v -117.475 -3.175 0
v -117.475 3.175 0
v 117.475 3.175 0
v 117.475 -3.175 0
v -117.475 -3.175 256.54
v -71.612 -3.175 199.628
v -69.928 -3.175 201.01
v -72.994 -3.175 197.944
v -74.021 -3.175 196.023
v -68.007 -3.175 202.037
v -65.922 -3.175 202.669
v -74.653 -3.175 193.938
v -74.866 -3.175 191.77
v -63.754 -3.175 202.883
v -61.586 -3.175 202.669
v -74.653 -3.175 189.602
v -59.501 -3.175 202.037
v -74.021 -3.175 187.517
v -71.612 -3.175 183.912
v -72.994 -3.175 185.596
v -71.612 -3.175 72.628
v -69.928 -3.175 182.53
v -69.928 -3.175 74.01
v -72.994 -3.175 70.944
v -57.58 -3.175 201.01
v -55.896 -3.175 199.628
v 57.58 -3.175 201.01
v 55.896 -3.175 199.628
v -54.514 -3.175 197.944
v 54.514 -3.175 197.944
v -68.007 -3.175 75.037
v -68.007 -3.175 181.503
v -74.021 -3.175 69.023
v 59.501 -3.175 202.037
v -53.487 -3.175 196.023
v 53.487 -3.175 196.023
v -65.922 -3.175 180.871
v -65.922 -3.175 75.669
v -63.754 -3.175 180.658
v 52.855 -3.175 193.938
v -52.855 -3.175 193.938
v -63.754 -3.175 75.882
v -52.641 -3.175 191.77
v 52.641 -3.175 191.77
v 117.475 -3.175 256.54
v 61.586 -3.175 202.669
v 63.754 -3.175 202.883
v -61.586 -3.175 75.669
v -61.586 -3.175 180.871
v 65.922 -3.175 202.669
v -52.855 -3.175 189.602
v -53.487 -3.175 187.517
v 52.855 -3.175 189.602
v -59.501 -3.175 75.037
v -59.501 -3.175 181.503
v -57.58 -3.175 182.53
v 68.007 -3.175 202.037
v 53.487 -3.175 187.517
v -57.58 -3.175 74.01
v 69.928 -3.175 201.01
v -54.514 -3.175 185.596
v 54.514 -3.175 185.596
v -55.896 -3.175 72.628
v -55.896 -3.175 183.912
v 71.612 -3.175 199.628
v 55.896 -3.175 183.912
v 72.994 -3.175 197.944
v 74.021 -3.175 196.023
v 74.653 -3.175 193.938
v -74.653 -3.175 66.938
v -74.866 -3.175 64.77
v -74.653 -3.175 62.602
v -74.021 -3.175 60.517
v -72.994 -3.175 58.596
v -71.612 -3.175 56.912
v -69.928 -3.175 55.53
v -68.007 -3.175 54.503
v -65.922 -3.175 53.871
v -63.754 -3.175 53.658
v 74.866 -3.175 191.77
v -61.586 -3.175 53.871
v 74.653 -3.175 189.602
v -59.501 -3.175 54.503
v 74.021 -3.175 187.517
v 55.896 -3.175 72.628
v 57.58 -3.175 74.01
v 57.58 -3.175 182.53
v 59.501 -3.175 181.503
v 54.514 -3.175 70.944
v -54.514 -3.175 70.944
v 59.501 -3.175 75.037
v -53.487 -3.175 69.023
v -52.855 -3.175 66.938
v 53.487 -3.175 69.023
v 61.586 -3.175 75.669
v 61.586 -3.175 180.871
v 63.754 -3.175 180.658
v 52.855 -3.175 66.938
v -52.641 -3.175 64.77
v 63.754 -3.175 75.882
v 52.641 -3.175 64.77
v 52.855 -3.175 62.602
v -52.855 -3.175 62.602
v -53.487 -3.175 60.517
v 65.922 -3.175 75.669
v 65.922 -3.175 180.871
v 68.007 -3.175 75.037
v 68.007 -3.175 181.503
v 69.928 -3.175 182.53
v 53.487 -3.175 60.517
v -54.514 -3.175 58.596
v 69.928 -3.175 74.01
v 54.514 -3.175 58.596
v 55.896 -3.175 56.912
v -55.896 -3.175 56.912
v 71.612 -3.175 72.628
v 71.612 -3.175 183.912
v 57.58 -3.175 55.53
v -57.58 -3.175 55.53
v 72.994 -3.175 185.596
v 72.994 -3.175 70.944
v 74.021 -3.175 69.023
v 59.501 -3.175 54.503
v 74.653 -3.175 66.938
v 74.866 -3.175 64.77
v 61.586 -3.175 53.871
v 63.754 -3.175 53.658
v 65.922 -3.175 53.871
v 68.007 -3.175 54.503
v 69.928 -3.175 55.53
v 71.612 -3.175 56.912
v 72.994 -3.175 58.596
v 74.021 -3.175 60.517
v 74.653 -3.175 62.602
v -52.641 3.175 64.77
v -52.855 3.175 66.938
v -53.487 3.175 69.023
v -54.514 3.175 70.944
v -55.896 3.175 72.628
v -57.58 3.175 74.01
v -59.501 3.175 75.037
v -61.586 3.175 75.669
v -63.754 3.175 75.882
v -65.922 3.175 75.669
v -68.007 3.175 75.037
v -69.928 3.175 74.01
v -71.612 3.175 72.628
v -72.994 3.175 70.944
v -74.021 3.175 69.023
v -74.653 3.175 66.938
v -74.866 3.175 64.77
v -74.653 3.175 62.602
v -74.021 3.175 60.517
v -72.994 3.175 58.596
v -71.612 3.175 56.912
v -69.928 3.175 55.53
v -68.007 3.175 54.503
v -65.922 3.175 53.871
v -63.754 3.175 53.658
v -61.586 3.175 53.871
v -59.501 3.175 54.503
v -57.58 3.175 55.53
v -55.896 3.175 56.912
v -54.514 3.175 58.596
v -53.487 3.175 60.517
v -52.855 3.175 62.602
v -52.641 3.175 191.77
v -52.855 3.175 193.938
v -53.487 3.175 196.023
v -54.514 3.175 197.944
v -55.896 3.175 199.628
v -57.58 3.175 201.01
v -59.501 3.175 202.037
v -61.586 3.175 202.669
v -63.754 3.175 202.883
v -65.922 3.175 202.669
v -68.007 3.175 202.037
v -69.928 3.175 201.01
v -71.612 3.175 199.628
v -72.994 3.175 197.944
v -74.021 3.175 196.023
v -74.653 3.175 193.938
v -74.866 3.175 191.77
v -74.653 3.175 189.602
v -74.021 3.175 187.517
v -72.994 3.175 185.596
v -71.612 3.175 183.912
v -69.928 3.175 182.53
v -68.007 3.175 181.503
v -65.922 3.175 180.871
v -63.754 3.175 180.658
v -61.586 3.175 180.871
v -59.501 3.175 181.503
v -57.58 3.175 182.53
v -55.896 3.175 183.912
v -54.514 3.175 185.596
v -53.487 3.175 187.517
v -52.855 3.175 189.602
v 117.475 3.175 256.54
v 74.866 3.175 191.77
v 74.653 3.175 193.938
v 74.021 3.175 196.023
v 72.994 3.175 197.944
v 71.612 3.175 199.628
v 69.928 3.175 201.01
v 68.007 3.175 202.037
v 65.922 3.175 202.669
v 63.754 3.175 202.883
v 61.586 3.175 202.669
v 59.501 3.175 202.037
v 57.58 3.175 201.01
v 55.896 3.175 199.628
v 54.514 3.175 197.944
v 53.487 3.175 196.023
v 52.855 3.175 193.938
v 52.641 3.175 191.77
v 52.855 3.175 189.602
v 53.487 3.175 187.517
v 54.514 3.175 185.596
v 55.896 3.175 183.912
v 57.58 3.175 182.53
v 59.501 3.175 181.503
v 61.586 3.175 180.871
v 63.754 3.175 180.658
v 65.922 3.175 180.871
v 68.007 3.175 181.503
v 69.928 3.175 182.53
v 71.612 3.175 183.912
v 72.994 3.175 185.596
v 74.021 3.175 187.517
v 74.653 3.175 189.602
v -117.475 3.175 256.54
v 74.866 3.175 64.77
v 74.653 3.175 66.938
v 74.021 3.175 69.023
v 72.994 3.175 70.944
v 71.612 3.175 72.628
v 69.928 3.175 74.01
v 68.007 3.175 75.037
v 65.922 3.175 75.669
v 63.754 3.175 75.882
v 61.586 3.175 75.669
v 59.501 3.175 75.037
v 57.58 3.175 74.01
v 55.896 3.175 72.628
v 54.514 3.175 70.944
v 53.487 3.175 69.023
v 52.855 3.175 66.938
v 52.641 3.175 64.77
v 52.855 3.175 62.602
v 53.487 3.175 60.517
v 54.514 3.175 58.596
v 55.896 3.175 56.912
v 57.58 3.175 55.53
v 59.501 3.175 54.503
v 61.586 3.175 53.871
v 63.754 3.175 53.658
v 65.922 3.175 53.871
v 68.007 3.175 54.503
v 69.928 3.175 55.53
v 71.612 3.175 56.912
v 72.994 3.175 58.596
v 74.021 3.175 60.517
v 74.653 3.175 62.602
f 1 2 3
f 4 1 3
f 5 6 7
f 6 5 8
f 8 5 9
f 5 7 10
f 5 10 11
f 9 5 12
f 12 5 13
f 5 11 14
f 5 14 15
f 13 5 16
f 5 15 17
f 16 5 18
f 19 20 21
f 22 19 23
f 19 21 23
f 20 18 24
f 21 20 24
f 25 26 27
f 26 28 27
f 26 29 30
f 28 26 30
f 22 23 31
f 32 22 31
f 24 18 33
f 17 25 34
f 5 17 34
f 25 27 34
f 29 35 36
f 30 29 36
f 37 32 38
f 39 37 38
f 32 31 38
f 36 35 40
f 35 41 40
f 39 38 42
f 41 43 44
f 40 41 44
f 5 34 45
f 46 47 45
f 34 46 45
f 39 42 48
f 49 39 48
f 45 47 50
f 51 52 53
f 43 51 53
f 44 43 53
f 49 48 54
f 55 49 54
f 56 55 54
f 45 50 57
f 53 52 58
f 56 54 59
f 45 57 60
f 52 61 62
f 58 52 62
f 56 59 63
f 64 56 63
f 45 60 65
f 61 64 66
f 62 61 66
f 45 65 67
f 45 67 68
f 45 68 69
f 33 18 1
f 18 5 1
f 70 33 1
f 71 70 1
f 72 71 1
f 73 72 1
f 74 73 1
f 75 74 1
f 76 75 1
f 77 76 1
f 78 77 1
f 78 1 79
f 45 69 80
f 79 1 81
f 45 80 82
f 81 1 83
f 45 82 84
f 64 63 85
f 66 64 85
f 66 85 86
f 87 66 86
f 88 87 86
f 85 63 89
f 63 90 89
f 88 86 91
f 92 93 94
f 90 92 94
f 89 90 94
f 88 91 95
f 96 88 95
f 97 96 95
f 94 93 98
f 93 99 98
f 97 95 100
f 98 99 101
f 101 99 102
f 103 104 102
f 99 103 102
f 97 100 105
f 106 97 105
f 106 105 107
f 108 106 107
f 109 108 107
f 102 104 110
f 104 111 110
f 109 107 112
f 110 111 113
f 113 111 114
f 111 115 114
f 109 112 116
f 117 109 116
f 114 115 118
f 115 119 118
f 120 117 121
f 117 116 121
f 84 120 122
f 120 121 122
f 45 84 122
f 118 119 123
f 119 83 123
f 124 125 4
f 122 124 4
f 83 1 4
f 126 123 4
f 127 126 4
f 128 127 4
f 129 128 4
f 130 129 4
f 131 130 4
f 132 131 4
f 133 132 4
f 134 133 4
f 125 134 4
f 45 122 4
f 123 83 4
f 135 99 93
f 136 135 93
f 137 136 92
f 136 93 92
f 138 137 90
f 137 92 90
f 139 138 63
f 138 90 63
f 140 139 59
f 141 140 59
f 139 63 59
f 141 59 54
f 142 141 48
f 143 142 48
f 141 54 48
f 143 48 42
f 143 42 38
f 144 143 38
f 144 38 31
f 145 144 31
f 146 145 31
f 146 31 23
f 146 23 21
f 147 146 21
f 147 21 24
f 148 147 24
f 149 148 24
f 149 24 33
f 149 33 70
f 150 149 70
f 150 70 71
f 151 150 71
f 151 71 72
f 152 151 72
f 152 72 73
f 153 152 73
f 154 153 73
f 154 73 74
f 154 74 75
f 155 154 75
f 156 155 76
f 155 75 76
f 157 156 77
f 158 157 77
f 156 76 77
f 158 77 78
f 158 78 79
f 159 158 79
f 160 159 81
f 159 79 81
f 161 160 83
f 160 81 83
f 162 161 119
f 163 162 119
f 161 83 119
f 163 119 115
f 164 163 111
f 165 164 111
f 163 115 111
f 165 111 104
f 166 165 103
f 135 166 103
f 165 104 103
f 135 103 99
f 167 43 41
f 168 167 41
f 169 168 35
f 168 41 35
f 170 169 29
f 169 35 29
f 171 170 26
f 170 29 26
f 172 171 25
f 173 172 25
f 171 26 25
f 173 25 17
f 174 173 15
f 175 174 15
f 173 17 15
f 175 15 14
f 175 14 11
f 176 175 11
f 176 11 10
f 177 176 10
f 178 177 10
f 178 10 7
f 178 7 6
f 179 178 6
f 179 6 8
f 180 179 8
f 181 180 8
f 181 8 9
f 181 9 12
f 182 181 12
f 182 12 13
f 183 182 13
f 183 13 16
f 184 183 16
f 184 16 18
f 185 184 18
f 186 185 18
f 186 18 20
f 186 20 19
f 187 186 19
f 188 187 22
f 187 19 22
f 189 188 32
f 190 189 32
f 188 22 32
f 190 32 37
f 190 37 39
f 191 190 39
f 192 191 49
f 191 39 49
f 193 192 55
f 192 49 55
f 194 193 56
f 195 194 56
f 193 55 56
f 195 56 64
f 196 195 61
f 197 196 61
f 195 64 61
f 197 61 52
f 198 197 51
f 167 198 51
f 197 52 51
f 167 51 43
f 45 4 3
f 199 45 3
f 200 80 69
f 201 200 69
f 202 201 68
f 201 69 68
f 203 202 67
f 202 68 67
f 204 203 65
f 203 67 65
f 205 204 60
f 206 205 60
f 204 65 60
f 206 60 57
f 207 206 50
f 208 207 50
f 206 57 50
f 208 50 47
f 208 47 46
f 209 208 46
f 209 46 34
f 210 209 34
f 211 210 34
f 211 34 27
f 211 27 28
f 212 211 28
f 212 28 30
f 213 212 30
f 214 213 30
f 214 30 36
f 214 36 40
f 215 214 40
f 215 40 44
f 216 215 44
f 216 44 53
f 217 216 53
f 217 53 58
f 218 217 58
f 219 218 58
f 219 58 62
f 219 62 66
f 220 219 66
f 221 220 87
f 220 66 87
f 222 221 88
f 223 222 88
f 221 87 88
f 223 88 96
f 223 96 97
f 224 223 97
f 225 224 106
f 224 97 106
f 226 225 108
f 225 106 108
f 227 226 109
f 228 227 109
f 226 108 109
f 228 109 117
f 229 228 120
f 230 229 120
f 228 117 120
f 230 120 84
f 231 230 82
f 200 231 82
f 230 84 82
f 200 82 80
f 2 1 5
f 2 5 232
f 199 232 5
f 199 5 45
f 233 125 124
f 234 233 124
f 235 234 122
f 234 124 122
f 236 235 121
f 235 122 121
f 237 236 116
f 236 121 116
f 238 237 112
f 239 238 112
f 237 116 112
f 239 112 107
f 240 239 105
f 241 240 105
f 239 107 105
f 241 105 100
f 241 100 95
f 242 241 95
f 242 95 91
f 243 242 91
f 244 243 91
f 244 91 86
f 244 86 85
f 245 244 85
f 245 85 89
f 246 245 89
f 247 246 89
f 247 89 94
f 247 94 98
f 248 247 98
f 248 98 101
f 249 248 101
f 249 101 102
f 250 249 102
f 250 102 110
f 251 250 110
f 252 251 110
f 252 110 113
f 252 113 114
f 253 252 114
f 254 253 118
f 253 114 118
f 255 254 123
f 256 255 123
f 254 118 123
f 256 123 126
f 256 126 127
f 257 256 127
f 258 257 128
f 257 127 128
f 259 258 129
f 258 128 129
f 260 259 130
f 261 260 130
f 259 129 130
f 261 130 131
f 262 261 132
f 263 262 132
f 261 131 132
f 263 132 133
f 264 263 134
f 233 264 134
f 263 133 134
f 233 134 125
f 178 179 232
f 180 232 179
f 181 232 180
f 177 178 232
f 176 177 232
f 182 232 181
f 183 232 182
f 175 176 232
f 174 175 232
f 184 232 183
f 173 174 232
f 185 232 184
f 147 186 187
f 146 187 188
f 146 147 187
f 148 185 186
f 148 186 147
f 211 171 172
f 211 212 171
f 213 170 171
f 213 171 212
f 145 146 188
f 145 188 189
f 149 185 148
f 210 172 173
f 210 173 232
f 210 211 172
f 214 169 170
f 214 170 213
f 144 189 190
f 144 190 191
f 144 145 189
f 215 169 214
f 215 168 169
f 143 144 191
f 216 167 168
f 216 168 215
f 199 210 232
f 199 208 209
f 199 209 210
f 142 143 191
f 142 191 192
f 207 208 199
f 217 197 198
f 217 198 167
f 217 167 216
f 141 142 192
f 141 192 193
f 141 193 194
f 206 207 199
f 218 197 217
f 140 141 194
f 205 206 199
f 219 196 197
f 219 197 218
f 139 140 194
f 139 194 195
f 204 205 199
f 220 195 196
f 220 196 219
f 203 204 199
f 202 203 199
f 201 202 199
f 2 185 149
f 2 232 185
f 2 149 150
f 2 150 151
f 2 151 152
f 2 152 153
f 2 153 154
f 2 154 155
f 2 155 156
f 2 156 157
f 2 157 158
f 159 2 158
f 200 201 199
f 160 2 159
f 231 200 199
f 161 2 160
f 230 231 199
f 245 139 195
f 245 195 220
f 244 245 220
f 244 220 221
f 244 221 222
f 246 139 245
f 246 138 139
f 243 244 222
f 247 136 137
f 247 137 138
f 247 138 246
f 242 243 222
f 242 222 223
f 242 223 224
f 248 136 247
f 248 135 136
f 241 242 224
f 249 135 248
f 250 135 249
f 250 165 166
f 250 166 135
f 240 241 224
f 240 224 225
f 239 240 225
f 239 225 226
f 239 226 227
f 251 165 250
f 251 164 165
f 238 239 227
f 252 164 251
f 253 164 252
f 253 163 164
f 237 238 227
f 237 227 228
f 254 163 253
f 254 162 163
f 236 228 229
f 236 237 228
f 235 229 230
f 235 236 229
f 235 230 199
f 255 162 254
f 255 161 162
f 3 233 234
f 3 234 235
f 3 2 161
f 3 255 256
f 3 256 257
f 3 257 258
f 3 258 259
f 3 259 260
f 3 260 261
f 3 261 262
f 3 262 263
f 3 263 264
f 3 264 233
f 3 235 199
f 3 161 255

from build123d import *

# Parameters (mm, degrees)
SKETCH1_W           = 234.95
SKETCH1_H           = 6.35
BOSS_EXTRUDE1_DEPTH = 256.54
CUT_EXTRUDE1_REACH  = 284.229
SKETCH2_R           = 11.1125


with BuildPart() as part:
    # Sketch1 → Boss-Extrude1 (new body)
    with BuildSketch(Plane.XY):
        Rectangle(SKETCH1_W, SKETCH1_H)
    extrude(amount=BOSS_EXTRUDE1_DEPTH)

    # Sketch2 → Cut-Extrude1 (cut, up to next)
    with BuildSketch(Plane.XZ.offset(3.175), mode=Mode.PRIVATE) as cut_extrude1_sk1:
        with Locations((-63.754, 191.77)):
            Circle(SKETCH2_R)
    cut_extrude1_tool1 = extrude(cut_extrude1_sk1.sketch, amount=-CUT_EXTRUDE1_REACH, mode=Mode.PRIVATE) & part.part
    # Sketch2 → Cut-Extrude1 (cut, up to next)
    with BuildSketch(Plane.XZ.offset(3.175), mode=Mode.PRIVATE) as cut_extrude1_sk2:
        with Locations((-63.754, 64.77)):
            Circle(SKETCH2_R)
    cut_extrude1_tool2 = extrude(cut_extrude1_sk2.sketch, amount=-CUT_EXTRUDE1_REACH, mode=Mode.PRIVATE) & part.part
    # Sketch2 → Cut-Extrude1 (cut, up to next)
    with BuildSketch(Plane.XZ.offset(3.175), mode=Mode.PRIVATE) as cut_extrude1_sk3:
        with Locations((63.754, 64.77)):
            Circle(SKETCH2_R)
    cut_extrude1_tool3 = extrude(cut_extrude1_sk3.sketch, amount=-CUT_EXTRUDE1_REACH, mode=Mode.PRIVATE) & part.part
    # Sketch2 → Cut-Extrude1 (cut, up to next)
    with BuildSketch(Plane.XZ.offset(3.175), mode=Mode.PRIVATE) as cut_extrude1_sk4:
        with Locations((63.754, 191.77)):
            Circle(SKETCH2_R)
    cut_extrude1_tool4 = extrude(cut_extrude1_sk4.sketch, amount=-CUT_EXTRUDE1_REACH, mode=Mode.PRIVATE) & part.part
    add(cut_extrude1_tool1.solids().sort_by_distance((-63.754, -3.175, 191.77))[0], mode=Mode.SUBTRACT)
    add(cut_extrude1_tool2.solids().sort_by_distance((-63.754, -3.175, 64.77))[0], mode=Mode.SUBTRACT)
    add(cut_extrude1_tool3.solids().sort_by_distance((63.754, -3.175, 64.77))[0], mode=Mode.SUBTRACT)
    add(cut_extrude1_tool4.solids().sort_by_distance((63.754, -3.175, 191.77))[0], mode=Mode.SUBTRACT)


solid = part.part
